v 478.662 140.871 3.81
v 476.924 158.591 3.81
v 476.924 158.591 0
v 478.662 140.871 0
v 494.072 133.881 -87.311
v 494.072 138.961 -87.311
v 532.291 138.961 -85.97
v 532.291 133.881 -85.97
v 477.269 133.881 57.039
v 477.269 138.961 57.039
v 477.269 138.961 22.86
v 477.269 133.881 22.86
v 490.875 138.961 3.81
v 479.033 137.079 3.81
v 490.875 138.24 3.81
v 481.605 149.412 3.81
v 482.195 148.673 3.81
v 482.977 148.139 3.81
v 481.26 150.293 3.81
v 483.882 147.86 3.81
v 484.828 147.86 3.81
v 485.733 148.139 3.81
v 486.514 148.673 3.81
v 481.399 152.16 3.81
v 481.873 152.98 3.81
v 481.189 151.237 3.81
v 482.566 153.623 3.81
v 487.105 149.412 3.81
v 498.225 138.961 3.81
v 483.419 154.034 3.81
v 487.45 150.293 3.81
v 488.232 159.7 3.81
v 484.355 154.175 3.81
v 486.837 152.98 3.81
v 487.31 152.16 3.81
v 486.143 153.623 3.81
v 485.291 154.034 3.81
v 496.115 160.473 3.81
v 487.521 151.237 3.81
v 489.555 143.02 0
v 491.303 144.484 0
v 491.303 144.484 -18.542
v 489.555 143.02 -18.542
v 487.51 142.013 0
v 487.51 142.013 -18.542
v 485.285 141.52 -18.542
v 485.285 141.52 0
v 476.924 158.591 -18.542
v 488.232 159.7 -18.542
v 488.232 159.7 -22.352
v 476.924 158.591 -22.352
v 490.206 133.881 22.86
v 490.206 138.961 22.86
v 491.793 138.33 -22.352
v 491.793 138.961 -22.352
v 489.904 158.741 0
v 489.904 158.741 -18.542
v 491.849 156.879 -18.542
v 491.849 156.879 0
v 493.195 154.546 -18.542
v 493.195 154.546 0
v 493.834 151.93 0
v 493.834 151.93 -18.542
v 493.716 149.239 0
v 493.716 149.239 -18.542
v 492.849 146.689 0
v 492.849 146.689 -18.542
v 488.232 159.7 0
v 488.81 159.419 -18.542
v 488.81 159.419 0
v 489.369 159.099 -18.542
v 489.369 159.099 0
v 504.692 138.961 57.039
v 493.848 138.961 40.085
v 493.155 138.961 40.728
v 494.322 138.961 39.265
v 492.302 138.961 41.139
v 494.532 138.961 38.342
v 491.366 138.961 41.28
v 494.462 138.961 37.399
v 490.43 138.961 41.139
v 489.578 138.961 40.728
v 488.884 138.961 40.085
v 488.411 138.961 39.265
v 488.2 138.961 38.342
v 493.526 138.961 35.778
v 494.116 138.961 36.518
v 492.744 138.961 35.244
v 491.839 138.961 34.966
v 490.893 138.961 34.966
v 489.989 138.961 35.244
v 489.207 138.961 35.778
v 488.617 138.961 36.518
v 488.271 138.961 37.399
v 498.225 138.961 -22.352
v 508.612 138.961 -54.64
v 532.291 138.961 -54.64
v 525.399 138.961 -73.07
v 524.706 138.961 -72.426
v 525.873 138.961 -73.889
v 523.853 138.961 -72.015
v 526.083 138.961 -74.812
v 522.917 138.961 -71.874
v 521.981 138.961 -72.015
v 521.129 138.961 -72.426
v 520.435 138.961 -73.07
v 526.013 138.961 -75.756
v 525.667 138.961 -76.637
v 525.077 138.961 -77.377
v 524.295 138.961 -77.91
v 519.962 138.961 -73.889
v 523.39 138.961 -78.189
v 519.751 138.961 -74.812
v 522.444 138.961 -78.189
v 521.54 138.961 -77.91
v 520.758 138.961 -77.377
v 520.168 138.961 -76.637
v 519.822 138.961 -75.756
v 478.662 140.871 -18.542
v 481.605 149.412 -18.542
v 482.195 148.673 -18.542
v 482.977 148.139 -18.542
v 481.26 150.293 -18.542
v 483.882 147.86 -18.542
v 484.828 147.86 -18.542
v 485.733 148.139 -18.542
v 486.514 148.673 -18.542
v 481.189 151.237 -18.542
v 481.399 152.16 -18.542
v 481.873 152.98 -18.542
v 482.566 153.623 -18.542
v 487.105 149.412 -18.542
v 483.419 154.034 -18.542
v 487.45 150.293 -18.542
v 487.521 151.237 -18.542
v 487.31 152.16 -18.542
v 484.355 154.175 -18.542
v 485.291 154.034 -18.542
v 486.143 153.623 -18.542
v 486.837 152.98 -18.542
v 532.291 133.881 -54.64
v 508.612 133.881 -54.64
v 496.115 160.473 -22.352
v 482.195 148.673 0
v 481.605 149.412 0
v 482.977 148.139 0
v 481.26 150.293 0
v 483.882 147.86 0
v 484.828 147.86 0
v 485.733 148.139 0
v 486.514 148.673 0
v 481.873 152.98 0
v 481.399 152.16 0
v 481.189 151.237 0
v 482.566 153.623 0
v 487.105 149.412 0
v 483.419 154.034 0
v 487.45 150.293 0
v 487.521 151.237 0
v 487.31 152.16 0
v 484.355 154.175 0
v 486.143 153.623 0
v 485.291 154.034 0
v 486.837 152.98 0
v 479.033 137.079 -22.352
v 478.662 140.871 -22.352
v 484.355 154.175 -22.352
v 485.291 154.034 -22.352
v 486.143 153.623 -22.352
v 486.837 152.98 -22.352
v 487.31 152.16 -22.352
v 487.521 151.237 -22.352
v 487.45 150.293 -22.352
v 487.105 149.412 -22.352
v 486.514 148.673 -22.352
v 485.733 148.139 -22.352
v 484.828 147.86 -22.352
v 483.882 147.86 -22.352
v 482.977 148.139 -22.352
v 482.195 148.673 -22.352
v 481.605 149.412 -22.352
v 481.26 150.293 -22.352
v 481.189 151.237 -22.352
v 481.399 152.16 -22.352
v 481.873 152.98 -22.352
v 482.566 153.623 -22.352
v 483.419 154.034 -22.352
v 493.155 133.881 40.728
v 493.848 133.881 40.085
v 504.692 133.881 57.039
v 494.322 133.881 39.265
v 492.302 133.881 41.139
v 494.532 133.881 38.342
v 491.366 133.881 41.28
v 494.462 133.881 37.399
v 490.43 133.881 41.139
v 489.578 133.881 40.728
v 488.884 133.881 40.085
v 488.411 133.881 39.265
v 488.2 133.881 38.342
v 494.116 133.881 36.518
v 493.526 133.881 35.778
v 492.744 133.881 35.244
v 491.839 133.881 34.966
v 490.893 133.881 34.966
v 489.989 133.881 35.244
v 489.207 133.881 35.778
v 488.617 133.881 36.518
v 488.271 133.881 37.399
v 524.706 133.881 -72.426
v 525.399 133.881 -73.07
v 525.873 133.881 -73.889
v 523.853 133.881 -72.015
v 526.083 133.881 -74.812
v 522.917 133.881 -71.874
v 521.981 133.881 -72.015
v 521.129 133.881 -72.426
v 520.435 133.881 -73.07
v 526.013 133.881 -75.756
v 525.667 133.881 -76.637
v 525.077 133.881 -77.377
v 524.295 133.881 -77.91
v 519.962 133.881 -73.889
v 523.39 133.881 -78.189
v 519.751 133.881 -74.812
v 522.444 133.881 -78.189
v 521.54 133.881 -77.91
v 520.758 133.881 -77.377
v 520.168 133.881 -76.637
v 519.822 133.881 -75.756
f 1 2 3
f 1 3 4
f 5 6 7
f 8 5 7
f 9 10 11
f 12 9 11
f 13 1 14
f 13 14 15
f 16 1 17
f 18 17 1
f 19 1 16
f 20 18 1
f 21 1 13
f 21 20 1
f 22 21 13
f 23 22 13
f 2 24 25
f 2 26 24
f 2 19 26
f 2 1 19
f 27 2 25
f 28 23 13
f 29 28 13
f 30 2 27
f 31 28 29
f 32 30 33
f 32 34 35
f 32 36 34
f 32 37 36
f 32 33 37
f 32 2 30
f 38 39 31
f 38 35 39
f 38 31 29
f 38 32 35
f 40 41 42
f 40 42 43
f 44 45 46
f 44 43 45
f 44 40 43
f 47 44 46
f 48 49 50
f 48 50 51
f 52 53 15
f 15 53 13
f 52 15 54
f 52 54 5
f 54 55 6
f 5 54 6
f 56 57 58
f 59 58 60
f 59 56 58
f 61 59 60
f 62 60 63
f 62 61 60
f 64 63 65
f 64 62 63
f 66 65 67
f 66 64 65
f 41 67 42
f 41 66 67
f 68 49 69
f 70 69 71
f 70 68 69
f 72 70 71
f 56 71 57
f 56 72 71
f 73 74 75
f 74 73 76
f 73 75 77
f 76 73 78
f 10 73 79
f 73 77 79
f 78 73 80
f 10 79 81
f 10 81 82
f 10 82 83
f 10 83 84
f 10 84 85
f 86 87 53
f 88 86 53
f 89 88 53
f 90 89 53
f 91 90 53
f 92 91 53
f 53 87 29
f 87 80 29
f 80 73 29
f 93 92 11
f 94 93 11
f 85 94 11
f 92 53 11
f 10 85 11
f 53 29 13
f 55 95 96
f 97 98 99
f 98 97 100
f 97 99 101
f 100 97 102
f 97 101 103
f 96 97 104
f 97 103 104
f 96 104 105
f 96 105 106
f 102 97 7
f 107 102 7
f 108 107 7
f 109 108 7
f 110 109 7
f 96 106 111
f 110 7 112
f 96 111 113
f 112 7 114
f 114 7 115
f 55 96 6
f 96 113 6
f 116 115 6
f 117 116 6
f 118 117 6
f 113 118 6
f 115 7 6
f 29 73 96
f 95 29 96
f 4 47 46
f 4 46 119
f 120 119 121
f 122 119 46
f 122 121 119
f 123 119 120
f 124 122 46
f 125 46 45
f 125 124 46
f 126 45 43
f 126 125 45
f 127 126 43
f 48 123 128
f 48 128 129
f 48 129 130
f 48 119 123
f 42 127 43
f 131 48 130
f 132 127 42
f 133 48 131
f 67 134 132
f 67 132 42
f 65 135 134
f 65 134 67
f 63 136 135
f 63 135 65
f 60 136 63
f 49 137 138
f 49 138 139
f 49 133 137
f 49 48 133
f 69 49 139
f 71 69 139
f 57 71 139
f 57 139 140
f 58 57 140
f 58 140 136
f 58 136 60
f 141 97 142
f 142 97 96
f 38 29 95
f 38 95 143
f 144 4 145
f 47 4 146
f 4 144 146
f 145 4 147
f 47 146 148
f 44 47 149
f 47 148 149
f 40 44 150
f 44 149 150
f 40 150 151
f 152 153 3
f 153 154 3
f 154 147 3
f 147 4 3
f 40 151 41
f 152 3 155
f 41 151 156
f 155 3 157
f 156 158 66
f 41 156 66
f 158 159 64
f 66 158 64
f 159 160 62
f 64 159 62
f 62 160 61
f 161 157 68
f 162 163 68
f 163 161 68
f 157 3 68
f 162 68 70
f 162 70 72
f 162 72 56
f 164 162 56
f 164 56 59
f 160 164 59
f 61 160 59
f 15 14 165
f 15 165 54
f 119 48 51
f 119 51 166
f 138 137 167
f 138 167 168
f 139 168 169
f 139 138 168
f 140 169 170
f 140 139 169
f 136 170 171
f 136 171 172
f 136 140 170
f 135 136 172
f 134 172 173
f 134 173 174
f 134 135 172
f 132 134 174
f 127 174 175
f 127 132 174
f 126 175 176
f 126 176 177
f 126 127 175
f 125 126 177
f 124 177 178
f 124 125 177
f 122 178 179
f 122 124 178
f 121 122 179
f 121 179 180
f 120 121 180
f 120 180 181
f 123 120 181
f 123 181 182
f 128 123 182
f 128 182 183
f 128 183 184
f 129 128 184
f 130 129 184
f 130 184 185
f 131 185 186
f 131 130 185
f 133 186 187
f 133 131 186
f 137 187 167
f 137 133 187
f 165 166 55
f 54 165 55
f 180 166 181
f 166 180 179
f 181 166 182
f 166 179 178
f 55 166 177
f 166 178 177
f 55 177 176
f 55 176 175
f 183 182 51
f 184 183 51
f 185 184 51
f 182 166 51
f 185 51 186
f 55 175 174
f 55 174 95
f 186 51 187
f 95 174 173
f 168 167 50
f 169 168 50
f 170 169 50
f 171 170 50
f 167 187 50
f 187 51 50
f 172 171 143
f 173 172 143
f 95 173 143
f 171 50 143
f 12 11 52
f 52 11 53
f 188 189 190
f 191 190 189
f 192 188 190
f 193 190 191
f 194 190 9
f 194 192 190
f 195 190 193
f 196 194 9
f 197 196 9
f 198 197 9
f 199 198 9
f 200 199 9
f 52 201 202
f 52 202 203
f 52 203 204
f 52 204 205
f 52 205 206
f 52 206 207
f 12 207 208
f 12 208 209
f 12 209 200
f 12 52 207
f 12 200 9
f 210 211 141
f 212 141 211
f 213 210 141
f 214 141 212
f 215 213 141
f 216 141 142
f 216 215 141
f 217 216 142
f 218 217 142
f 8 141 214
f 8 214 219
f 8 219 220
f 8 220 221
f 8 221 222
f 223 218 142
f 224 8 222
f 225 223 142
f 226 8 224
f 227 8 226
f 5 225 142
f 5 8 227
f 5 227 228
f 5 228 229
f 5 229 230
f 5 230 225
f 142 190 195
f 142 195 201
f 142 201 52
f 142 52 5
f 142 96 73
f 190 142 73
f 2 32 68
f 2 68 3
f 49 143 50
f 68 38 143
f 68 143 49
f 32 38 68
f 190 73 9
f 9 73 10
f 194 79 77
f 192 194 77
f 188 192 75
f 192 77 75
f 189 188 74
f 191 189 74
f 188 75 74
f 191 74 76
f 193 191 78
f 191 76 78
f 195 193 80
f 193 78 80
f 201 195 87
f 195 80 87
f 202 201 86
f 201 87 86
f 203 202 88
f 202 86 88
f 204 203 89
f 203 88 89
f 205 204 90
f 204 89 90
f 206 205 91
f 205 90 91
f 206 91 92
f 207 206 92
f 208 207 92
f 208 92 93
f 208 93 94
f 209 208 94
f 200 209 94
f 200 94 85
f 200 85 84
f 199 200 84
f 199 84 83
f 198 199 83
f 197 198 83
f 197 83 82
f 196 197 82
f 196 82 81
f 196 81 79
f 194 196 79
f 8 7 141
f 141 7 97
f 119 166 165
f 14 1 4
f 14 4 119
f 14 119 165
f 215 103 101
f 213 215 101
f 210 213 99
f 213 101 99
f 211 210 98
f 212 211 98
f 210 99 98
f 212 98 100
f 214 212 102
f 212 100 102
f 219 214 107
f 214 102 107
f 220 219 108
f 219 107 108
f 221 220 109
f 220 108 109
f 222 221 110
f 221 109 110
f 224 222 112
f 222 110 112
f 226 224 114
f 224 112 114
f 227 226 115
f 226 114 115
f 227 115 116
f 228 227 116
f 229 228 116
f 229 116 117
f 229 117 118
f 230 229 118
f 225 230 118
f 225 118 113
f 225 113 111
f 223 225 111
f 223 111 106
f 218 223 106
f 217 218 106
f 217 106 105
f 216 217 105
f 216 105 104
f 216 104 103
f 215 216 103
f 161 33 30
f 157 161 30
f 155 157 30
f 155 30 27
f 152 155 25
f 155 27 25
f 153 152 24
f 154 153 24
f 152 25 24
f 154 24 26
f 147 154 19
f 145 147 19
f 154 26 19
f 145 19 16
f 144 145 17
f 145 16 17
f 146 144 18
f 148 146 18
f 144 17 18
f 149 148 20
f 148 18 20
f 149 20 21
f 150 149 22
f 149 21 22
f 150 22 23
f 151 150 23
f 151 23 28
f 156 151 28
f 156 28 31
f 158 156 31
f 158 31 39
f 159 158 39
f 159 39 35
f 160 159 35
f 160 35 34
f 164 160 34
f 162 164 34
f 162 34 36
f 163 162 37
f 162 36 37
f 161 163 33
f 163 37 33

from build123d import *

# Parameters (mm, degrees)
BOSS_EXTRUDE5_DEPTH = 22.352
BOSS_EXTRUDE7_START = -3.81
SKETCH2_R           = 3.175
BOSS_EXTRUDE7_DEPTH = 3.81
BOSS_EXTRUDE8_START = 3.81
SKETCH3_R           = 3.175
BOSS_EXTRUDE8_DEPTH = 3.81
BOSS_EXTRUDE9_DEPTH = 5.08
SKETCH6_R           = 3.175
CUT_EXTRUDE1_DEPTH  = 6.35


with BuildPart() as part:
    # Sketch1 → Boss-Extrude5 (new body)
    with BuildSketch(Plane.XY):
        with BuildLine():
            Line((485.284620904, 141.520479852), (478.661596161, 140.870936716))
            Line((478.661596161, 140.870936716), (479.033472001, 137.079128657))
            Line((479.033472001, 137.079128657), (498.224726786, 138.961281946))
            Line((498.224726786, 138.961281946), (496.114951182, 160.473473003))
            Line((496.114951182, 160.473473003), (488.231748542, 159.700339826))
            ThreePointArc((488.231748542, 159.700339826), (489.092376455, 159.263306748), (489.904354663, 158.741416237))
            ThreePointArc((489.904354663, 158.741416237), (493.83445145, 151.929689602), (491.302607825, 144.484217934))
            ThreePointArc((491.302607825, 144.484217934), (488.563156596, 142.455032775), (485.284620904, 141.520479852))
        make_face()
    extrude(amount=-BOSS_EXTRUDE5_DEPTH)

    # Sketch2 → Boss-Extrude7 (add)
    with BuildSketch(Plane(origin=(0, 0, -22.352), x_dir=(-1, 0, 0), z_dir=(0, 0, -1)).offset(BOSS_EXTRUDE7_START)):
        with BuildLine():
            Line((-476.923696397, 158.591319714), (-478.661596161, 140.870936716))
            Line((-478.661596161, 140.870936716), (-485.284620904, 141.520479852))
            ThreePointArc((-485.284620904, 141.520479852), (-493.757189232, 149.475804861), (-488.231748542, 159.700339826))
            Line((-488.231748542, 159.700339826), (-476.923696397, 158.591319714))
        make_face()
        with Locations(Location((-484.354931302, 151, 0), (0, 0, 90))):
            Circle(SKETCH2_R, mode=Mode.SUBTRACT)
    extrude(amount=BOSS_EXTRUDE7_DEPTH)

    # Sketch3 → Boss-Extrude8 (add)
    # profile 1 of 2: a face of its own
    with BuildSketch(Plane.XY.offset(BOSS_EXTRUDE8_START)):
        with BuildLine():
            Line((488.231748542, 159.700339826), (476.923696397, 158.591319714))
            Line((476.923696397, 158.591319714), (478.661596161, 140.870936716))
            Line((478.661596161, 140.870936716), (485.284620904, 141.520479852))
            ThreePointArc((485.284620904, 141.520479852), (493.757189232, 149.475804861), (488.231748542, 159.700339826))
        make_face()
        with Locations(Location((484.354931302, 151, 0), (0, 0, 90))):
            Circle(SKETCH3_R, mode=Mode.SUBTRACT)
    # profile 2 of 2: a face of its own
    with BuildSketch(Plane.XY.offset(BOSS_EXTRUDE8_START)):
        with BuildLine():
            Line((496.114951182, 160.473473003), (488.231748542, 159.700339826))
            ThreePointArc((488.231748542, 159.700339826), (493.757189232, 149.475804861), (485.284620904, 141.520479852))
            Line((485.284620904, 141.520479852), (478.661596161, 140.870936716))
            Line((478.661596161, 140.870936716), (479.033472001, 137.079128657))
            Line((479.033472001, 137.079128657), (498.224726786, 138.961281946))
            Line((498.224726786, 138.961281946), (496.114951182, 160.473473003))
        make_face()
    extrude(amount=-BOSS_EXTRUDE8_DEPTH)

    # Sketch4 → Boss-Extrude9 (add)
    with BuildSketch(Plane(origin=(0, 138.961281946, 0), x_dir=(1, 0, 0), z_dir=(0, 1, 0))):
        Polygon((494.072487043, 87.311338989), (532.291432121, 85.970092731), (532.291432121, 54.640280545), (508.611718184, 54.640280545), (504.692489504, -57.038529169), (477.269374414, -57.038529169), (477.269374414, -22.86), (490.206161169, -22.86), align=None)
    extrude(amount=-BOSS_EXTRUDE9_DEPTH)

    # Sketch6 → Cut-Extrude1 (cut)
    with BuildSketch(Plane(origin=(0, 138.961281946, 0), x_dir=(1, 0, 0), z_dir=(0, 1, 0))):
        with Locations(Location((491.366130704, -38.105065935, 0), (0, 0, 270))):
            Circle(SKETCH6_R)
        with Locations(Location((522.91714349, 75.049167666, 0), (0, 0, 270))):
            Circle(SKETCH6_R)
    extrude(amount=-CUT_EXTRUDE1_DEPTH, mode=Mode.SUBTRACT)


solid = part.part
